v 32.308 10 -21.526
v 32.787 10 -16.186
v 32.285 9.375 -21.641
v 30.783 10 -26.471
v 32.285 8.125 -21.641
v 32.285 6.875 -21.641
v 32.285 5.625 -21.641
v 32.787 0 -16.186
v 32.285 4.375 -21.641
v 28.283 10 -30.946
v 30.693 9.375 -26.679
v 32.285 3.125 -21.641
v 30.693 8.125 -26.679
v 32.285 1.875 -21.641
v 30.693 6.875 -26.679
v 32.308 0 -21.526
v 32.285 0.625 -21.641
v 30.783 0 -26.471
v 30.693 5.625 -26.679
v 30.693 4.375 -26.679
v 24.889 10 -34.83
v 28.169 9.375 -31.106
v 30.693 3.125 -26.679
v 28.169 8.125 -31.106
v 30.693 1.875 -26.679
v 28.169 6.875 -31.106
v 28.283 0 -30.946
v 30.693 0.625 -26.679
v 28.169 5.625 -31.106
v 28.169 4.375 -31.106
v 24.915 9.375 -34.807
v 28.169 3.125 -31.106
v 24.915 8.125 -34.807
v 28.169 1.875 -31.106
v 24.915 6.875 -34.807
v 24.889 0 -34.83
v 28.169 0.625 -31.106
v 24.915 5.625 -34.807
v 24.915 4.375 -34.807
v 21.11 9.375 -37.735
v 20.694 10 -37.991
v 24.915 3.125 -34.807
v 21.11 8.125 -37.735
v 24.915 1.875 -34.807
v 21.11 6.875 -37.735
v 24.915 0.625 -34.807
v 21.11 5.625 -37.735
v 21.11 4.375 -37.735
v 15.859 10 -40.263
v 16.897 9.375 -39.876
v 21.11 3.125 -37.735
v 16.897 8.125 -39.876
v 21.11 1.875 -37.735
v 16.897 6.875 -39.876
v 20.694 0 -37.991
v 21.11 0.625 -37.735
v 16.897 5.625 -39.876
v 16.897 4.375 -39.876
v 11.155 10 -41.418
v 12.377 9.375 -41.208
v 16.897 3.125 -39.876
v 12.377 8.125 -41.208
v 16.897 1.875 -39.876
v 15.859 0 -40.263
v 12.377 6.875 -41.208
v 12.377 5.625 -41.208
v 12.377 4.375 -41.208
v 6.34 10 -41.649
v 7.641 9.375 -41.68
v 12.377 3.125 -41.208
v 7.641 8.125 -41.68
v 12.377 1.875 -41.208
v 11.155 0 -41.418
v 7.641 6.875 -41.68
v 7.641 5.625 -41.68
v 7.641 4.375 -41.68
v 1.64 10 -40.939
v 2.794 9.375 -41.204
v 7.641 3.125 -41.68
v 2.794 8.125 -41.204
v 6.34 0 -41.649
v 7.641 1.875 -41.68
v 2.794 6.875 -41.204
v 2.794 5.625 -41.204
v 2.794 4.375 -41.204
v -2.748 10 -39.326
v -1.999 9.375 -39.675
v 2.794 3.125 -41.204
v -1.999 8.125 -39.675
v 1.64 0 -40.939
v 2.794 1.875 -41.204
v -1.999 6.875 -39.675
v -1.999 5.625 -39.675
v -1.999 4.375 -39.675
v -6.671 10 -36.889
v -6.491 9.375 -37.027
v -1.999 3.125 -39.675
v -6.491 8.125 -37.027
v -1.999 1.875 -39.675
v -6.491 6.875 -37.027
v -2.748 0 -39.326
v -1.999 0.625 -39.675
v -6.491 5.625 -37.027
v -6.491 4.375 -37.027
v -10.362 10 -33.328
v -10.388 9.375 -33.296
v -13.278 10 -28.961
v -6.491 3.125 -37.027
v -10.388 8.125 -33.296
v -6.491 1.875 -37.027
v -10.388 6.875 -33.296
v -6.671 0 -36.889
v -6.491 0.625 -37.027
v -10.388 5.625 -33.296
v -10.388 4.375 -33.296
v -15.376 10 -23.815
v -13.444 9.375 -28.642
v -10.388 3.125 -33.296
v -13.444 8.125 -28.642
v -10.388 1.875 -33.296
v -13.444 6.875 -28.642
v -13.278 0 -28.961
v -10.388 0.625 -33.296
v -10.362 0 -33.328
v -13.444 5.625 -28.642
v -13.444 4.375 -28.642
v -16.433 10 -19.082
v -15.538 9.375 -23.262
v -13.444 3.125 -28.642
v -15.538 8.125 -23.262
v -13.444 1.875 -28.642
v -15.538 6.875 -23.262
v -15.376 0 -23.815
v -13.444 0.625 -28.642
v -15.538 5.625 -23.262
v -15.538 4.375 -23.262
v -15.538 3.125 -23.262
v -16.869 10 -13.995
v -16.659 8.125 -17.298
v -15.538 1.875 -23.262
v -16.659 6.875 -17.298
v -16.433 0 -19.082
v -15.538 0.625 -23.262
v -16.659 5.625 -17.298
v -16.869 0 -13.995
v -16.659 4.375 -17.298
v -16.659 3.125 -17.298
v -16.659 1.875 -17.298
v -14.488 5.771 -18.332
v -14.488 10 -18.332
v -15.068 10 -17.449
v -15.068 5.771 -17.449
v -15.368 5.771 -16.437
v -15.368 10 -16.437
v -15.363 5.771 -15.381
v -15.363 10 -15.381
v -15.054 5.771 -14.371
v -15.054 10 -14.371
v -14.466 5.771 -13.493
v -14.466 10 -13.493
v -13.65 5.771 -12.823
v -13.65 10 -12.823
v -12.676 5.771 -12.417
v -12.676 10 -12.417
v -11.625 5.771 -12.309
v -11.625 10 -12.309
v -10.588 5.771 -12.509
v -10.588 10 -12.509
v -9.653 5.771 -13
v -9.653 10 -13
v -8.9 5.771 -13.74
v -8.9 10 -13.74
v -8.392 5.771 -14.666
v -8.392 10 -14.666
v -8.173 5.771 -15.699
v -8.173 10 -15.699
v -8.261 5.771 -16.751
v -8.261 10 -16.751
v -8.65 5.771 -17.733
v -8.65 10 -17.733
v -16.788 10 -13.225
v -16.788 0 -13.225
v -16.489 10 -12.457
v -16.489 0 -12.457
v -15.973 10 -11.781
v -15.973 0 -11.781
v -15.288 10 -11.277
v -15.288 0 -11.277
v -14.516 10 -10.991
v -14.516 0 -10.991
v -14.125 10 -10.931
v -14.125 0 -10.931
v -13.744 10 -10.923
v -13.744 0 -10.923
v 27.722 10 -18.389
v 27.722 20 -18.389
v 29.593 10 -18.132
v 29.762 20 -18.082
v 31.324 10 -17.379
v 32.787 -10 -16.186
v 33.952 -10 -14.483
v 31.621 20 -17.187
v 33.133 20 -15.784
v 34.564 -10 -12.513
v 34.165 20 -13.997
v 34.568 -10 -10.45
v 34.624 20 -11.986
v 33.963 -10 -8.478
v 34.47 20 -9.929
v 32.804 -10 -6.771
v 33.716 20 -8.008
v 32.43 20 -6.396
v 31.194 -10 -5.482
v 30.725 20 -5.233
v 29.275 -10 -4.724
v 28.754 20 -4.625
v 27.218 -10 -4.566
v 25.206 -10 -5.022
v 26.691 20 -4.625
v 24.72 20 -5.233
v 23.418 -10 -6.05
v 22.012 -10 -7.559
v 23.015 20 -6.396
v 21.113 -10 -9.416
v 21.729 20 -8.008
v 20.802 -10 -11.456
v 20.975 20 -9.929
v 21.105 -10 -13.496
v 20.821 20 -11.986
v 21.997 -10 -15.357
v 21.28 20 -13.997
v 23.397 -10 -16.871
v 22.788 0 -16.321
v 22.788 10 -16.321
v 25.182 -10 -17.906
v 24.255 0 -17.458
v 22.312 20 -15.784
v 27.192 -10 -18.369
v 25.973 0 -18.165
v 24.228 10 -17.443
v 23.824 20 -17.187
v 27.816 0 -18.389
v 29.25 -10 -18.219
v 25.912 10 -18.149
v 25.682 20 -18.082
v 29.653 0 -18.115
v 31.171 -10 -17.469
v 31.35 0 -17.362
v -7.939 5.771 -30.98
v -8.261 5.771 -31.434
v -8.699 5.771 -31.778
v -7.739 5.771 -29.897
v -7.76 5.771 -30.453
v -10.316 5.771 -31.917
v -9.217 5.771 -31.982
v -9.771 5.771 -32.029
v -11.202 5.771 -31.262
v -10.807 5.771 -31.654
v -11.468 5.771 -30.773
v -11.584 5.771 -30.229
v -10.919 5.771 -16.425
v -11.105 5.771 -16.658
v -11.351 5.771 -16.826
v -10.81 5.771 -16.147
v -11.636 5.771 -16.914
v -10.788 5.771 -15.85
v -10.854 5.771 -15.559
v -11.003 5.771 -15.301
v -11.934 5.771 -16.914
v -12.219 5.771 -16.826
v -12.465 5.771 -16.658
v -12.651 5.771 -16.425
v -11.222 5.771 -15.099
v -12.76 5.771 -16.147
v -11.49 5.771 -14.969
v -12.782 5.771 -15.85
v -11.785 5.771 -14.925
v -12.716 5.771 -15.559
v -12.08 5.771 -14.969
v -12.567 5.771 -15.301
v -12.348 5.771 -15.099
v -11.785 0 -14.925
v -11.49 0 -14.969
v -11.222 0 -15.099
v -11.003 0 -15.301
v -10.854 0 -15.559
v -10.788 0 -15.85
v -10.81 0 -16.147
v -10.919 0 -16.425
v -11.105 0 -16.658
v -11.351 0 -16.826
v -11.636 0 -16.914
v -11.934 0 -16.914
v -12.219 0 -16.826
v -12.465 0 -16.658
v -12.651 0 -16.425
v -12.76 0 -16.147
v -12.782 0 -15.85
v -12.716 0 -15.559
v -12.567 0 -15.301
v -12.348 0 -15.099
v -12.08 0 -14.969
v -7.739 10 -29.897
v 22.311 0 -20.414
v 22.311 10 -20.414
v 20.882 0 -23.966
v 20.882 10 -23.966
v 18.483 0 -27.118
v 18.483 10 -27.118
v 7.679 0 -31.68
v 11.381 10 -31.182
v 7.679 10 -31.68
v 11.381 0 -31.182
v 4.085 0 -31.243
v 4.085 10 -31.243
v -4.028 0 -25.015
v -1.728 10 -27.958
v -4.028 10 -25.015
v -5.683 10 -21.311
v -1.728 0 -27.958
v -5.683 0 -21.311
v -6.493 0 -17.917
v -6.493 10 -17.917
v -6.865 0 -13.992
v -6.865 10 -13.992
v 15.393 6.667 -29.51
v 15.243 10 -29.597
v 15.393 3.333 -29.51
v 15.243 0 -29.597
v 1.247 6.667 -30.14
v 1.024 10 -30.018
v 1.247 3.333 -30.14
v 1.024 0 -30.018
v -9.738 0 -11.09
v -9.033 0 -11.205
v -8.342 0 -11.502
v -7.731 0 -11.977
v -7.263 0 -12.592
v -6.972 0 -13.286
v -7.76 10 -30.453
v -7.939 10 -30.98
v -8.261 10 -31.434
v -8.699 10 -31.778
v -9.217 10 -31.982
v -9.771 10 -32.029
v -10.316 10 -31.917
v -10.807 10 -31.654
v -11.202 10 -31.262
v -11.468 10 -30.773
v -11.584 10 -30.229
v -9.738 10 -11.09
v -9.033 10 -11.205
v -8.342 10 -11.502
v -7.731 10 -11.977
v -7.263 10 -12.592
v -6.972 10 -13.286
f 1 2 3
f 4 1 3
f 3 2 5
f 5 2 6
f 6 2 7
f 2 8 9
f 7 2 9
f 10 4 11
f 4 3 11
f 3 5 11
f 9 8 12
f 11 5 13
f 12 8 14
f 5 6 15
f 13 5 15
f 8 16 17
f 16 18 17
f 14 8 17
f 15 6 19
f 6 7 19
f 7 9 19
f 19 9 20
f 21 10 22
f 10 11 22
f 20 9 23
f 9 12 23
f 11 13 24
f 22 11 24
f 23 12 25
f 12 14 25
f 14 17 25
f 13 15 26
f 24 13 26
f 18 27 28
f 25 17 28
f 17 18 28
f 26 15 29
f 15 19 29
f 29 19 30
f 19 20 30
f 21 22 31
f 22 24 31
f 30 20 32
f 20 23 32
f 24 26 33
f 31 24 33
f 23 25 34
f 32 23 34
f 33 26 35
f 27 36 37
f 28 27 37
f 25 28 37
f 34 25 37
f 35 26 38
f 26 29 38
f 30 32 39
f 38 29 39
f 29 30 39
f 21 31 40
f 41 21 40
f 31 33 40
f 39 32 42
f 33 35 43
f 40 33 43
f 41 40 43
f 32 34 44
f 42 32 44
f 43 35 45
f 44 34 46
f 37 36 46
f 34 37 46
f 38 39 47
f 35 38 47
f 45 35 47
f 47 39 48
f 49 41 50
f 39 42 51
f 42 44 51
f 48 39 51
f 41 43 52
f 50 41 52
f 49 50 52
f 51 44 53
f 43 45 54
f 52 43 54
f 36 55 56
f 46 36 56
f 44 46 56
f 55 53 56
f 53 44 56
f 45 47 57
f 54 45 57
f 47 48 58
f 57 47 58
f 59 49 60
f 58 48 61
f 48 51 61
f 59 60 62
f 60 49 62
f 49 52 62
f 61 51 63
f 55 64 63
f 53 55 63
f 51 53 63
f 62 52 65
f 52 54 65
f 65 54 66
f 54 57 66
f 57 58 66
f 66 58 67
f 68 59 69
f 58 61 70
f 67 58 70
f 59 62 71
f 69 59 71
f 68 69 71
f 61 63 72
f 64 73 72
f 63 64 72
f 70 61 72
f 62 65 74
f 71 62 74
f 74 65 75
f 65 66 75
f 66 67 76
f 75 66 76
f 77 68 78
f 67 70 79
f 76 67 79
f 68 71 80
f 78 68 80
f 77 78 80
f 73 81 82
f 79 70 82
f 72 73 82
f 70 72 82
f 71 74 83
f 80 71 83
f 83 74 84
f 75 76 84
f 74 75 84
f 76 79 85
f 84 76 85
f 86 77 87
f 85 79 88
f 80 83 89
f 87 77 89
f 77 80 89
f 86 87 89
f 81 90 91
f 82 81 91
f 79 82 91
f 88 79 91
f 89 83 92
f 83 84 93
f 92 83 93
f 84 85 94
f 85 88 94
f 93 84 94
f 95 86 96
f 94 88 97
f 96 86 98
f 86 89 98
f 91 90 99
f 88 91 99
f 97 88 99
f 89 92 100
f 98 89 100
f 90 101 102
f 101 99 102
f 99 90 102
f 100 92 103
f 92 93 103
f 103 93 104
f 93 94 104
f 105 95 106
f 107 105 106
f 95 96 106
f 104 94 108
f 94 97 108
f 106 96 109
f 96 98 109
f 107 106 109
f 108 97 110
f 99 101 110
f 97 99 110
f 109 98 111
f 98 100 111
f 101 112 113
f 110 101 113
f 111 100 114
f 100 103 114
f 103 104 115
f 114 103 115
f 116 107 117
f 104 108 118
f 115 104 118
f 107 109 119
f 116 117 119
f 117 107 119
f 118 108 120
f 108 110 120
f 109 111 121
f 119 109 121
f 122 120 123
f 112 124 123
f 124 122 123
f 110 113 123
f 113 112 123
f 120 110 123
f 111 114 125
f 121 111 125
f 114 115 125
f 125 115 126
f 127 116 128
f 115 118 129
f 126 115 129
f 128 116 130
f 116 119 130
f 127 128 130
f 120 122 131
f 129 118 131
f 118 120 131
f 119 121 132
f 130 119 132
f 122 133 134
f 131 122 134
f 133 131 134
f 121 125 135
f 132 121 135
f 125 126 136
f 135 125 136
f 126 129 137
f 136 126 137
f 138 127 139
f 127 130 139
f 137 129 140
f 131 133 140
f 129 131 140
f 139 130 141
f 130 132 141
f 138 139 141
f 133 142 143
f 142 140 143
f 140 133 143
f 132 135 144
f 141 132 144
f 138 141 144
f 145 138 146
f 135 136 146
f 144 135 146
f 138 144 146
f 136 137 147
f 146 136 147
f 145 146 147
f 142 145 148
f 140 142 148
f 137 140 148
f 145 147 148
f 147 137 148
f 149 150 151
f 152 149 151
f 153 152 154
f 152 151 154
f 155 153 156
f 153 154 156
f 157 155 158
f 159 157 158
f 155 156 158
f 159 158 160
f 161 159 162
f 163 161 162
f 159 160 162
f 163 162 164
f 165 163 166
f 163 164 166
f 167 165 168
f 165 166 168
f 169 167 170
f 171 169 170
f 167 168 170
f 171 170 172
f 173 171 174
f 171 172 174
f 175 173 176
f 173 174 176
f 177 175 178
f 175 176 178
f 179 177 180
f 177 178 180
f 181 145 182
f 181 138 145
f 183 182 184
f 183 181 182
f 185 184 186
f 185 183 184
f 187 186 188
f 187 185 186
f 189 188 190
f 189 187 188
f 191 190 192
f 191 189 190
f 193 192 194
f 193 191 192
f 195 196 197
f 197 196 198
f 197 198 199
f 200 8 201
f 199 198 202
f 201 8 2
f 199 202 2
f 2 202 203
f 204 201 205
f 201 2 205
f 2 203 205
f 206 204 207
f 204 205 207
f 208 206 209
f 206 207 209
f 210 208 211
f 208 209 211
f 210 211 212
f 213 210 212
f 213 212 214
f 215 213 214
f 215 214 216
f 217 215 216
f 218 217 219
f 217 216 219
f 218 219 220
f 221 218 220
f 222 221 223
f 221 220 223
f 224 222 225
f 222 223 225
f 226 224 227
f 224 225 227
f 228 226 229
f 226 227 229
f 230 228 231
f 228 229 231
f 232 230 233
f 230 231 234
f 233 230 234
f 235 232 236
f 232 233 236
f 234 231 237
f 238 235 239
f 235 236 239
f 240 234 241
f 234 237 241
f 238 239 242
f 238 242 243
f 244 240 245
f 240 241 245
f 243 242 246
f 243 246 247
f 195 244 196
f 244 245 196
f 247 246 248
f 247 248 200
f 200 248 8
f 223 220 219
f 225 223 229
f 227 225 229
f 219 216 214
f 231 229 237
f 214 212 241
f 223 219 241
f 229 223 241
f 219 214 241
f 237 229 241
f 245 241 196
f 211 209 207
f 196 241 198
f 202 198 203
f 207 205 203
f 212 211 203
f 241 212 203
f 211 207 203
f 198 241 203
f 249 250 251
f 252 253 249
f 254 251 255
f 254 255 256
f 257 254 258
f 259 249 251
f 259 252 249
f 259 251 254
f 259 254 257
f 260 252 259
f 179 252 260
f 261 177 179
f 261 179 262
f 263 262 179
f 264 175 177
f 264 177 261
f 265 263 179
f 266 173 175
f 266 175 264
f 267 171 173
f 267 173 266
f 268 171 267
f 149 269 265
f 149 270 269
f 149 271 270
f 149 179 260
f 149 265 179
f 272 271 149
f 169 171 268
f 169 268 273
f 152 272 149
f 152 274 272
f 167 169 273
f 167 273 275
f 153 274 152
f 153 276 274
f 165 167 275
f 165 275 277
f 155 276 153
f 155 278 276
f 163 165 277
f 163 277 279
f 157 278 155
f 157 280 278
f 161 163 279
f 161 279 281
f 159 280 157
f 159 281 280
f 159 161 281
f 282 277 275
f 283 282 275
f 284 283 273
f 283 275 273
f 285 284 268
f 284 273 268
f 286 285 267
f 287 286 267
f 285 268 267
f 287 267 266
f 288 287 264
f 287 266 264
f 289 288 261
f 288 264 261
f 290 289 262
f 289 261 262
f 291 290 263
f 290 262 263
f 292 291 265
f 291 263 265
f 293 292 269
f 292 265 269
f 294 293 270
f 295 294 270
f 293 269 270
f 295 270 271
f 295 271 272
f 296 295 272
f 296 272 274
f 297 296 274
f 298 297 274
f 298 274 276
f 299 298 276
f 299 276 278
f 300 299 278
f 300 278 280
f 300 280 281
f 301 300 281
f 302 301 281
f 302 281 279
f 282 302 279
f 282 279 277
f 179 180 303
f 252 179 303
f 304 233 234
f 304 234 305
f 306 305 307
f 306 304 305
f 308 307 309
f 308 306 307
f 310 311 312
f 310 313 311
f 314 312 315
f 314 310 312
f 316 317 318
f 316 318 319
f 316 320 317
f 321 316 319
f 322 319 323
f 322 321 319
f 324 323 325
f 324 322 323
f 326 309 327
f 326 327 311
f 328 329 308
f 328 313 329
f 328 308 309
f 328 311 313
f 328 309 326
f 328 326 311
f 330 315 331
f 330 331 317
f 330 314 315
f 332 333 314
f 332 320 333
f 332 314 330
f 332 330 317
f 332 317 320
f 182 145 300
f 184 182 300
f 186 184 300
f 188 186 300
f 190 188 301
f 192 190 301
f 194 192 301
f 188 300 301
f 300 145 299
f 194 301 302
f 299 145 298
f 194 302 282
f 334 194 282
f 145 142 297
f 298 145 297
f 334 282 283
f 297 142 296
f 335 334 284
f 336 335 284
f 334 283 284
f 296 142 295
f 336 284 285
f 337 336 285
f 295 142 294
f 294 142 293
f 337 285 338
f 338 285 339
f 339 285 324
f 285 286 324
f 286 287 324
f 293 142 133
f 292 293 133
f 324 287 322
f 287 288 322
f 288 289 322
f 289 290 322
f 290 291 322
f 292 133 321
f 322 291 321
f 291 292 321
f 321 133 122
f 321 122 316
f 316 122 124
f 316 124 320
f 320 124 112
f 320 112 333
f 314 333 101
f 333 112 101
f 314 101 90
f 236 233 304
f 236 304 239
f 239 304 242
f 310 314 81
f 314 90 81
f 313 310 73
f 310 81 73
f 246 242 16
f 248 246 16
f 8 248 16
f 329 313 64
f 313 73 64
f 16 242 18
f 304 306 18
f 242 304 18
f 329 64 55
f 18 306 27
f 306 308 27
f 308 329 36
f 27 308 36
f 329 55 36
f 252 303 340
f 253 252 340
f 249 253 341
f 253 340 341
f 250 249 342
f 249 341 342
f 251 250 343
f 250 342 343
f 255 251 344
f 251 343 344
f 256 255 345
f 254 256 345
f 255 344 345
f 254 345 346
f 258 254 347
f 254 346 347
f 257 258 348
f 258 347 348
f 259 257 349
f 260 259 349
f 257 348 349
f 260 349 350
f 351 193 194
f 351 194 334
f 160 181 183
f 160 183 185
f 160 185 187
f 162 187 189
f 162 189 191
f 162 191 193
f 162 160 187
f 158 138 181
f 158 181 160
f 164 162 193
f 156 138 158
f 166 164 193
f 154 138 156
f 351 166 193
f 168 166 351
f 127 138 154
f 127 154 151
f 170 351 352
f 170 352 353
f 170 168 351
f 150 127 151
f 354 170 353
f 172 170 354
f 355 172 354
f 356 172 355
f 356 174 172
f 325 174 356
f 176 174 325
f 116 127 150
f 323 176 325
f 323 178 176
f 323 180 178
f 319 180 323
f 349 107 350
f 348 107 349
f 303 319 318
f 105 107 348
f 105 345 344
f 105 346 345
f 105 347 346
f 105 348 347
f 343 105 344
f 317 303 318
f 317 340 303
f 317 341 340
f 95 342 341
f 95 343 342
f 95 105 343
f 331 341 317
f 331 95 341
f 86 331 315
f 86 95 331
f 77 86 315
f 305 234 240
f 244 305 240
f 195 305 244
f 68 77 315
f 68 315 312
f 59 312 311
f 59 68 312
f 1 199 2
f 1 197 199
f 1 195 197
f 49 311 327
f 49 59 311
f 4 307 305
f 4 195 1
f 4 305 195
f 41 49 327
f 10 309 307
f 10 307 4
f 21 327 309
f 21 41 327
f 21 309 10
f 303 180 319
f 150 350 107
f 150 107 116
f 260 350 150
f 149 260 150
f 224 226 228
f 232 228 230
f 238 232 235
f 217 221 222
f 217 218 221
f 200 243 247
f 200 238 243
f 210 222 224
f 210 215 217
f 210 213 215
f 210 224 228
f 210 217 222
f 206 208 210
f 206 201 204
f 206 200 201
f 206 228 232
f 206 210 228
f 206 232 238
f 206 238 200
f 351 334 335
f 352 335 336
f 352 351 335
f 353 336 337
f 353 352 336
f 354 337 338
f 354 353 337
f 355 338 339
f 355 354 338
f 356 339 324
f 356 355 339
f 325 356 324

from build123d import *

# Parameters (mm, degrees)
EXTRUDE_THIN1_DEPTH = 10
SKETCH3_R           = 6.920707693
BOSS_EXTRUDE1_DEPTH = 10
BOSS_EXTRUDE3_START = -30
SKETCH6_R           = 6.920707693
BOSS_EXTRUDE3_DEPTH = 30
FILLET5_R           = 3
CUT_EXTRUDE2_DEPTH  = 4.2291
SKETCH8_R           = 1
CUT_EXTRUDE3_DEPTH  = 10


# Read off the part's stored shape, not the designer's step: Extrude-Thin1
with BuildPart() as part:
    # Extrude-Thin1 outline → Extrude-Thin1 (new body)
    with BuildSketch(Plane(origin=(0, 0, 0), x_dir=(1, 0, 0), z_dir=(0, 1, 0))):
        with BuildLine():
            Line((22.787644573, 16.321054497), (32.786727129, 16.185599595))
            add(Edge.make_bspline(
                [(32.786727129, 16.185599595), (32.811960434, 18.048285218), (32.641015725, 19.879615359), (31.92970267, 23.402358796), (31.389692113, 25.092847565), (29.996264529, 28.265553908), (29.143647795, 29.747564833), (27.19528421, 32.464868479), (26.100039873, 33.700572008), (23.728981302, 35.912471104), (22.453221171, 36.889166895), (19.767583781, 38.580346198), (18.357513706, 39.295168947), (15.436486932, 40.456738309), (13.925220488, 40.90365338), (10.829703301, 41.512793064), (9.245032555, 41.674991243), (6.03621689, 41.684984578), (4.411608755, 41.532400863), (1.175780595, 40.875380655), (-0.435544855, 40.370107305), (-3.562076247, 38.980716277), (-5.076448982, 38.095842257), (-7.905525663, 35.957656136), (-9.218857585, 34.704759204), (-11.55775534, 31.887270708), (-12.582900642, 30.324085176), (-14.305177479, 26.958999197), (-15.003087647, 25.157977385), (-16.072049137, 21.36655254), (-16.443959592, 19.376041131), (-16.874579144, 15.219557311), (-16.93365201, 13.053120971), (-16.839375878, 10.793799857)],
                knots=[0, 0, 0, 0, 0.0625, 0.0625, 0.125, 0.125, 0.1875, 0.1875, 0.25, 0.25, 0.3125, 0.3125, 0.375, 0.375, 0.4375, 0.4375, 0.5, 0.5, 0.5625, 0.5625, 0.625, 0.625, 0.6875, 0.6875, 0.75, 0.75, 0.8125, 0.8125, 0.875, 0.875, 0.9375, 0.9375, 1, 1, 1, 1], degree=3))
            Line((-16.839375878, 10.793799857), (-6.848070504, 11.210713427))
            add(Edge.make_bspline(
                [(22.787644573, 16.321054497), (23.040705887, 35.001670137), (-8.061946573, 40.30117097), (-6.848070504, 11.210713427)],
                knots=[0, 0, 0, 0, 1, 1, 1, 1], degree=3))
        make_face()
    extrude(amount=EXTRUDE_THIN1_DEPTH)

    # Sketch3 → Boss-Extrude1 (add)
    with BuildSketch(Plane.XZ):
        with Locations(Location((27.722370723, -11.46876918, 0), (0, 0, 317.034865558))):
            Circle(SKETCH3_R)
    extrude(amount=BOSS_EXTRUDE1_DEPTH)

    # Sketch6 → Boss-Extrude3 (add)
    with BuildSketch(Plane.XZ.offset(10).offset(BOSS_EXTRUDE3_START)):
        with Locations(Location((27.722370723, -11.46876918, 0), (0, 0, 270))):
            Circle(SKETCH6_R)
    extrude(amount=BOSS_EXTRUDE3_DEPTH)

    # Fillet5
    fillet5_edges = [part.edges().sort_by_distance(p)[0] for p in [
        (-6.848070504, 5, -11.210713427),
        (-16.839375878, 5, -10.793799857),
    ]]
    fillet(fillet5_edges, radius=FILLET5_R)

    # Sketch7 → Cut-Extrude2 (cut)
    with BuildSketch(Plane(origin=(0, 10, -10), x_dir=(1, 0, 0), z_dir=(0, -1, 0))):
        with BuildLine():
            Line((-8.649516125, -7.733026517), (-7.738756929, -19.897223008))
            ThreePointArc((-7.738756929, -19.897223008), (-9.492313797, -22.025587149), (-11.58447009, -20.228985455))
            Line((-11.58447009, -20.228985455), (-14.488068719, -8.331888199))
            ThreePointArc((-14.488068719, -8.331888199), (-12.154290458, -2.324192527), (-8.649516125, -7.733026517))
        make_face()
    extrude(amount=CUT_EXTRUDE2_DEPTH, mode=Mode.SUBTRACT)

    # Sketch8 → Cut-Extrude3 (cut)
    with BuildSketch(Plane(origin=(0, 5.7709, 0), x_dir=(1, 0, 0), z_dir=(0, 1, 0))):
        with Locations(Location((-11.784975147, 15.924801705, 0), (0, 0, 270))):
            Circle(SKETCH8_R)
    extrude(amount=-CUT_EXTRUDE3_DEPTH, mode=Mode.SUBTRACT)


solid = part.part
